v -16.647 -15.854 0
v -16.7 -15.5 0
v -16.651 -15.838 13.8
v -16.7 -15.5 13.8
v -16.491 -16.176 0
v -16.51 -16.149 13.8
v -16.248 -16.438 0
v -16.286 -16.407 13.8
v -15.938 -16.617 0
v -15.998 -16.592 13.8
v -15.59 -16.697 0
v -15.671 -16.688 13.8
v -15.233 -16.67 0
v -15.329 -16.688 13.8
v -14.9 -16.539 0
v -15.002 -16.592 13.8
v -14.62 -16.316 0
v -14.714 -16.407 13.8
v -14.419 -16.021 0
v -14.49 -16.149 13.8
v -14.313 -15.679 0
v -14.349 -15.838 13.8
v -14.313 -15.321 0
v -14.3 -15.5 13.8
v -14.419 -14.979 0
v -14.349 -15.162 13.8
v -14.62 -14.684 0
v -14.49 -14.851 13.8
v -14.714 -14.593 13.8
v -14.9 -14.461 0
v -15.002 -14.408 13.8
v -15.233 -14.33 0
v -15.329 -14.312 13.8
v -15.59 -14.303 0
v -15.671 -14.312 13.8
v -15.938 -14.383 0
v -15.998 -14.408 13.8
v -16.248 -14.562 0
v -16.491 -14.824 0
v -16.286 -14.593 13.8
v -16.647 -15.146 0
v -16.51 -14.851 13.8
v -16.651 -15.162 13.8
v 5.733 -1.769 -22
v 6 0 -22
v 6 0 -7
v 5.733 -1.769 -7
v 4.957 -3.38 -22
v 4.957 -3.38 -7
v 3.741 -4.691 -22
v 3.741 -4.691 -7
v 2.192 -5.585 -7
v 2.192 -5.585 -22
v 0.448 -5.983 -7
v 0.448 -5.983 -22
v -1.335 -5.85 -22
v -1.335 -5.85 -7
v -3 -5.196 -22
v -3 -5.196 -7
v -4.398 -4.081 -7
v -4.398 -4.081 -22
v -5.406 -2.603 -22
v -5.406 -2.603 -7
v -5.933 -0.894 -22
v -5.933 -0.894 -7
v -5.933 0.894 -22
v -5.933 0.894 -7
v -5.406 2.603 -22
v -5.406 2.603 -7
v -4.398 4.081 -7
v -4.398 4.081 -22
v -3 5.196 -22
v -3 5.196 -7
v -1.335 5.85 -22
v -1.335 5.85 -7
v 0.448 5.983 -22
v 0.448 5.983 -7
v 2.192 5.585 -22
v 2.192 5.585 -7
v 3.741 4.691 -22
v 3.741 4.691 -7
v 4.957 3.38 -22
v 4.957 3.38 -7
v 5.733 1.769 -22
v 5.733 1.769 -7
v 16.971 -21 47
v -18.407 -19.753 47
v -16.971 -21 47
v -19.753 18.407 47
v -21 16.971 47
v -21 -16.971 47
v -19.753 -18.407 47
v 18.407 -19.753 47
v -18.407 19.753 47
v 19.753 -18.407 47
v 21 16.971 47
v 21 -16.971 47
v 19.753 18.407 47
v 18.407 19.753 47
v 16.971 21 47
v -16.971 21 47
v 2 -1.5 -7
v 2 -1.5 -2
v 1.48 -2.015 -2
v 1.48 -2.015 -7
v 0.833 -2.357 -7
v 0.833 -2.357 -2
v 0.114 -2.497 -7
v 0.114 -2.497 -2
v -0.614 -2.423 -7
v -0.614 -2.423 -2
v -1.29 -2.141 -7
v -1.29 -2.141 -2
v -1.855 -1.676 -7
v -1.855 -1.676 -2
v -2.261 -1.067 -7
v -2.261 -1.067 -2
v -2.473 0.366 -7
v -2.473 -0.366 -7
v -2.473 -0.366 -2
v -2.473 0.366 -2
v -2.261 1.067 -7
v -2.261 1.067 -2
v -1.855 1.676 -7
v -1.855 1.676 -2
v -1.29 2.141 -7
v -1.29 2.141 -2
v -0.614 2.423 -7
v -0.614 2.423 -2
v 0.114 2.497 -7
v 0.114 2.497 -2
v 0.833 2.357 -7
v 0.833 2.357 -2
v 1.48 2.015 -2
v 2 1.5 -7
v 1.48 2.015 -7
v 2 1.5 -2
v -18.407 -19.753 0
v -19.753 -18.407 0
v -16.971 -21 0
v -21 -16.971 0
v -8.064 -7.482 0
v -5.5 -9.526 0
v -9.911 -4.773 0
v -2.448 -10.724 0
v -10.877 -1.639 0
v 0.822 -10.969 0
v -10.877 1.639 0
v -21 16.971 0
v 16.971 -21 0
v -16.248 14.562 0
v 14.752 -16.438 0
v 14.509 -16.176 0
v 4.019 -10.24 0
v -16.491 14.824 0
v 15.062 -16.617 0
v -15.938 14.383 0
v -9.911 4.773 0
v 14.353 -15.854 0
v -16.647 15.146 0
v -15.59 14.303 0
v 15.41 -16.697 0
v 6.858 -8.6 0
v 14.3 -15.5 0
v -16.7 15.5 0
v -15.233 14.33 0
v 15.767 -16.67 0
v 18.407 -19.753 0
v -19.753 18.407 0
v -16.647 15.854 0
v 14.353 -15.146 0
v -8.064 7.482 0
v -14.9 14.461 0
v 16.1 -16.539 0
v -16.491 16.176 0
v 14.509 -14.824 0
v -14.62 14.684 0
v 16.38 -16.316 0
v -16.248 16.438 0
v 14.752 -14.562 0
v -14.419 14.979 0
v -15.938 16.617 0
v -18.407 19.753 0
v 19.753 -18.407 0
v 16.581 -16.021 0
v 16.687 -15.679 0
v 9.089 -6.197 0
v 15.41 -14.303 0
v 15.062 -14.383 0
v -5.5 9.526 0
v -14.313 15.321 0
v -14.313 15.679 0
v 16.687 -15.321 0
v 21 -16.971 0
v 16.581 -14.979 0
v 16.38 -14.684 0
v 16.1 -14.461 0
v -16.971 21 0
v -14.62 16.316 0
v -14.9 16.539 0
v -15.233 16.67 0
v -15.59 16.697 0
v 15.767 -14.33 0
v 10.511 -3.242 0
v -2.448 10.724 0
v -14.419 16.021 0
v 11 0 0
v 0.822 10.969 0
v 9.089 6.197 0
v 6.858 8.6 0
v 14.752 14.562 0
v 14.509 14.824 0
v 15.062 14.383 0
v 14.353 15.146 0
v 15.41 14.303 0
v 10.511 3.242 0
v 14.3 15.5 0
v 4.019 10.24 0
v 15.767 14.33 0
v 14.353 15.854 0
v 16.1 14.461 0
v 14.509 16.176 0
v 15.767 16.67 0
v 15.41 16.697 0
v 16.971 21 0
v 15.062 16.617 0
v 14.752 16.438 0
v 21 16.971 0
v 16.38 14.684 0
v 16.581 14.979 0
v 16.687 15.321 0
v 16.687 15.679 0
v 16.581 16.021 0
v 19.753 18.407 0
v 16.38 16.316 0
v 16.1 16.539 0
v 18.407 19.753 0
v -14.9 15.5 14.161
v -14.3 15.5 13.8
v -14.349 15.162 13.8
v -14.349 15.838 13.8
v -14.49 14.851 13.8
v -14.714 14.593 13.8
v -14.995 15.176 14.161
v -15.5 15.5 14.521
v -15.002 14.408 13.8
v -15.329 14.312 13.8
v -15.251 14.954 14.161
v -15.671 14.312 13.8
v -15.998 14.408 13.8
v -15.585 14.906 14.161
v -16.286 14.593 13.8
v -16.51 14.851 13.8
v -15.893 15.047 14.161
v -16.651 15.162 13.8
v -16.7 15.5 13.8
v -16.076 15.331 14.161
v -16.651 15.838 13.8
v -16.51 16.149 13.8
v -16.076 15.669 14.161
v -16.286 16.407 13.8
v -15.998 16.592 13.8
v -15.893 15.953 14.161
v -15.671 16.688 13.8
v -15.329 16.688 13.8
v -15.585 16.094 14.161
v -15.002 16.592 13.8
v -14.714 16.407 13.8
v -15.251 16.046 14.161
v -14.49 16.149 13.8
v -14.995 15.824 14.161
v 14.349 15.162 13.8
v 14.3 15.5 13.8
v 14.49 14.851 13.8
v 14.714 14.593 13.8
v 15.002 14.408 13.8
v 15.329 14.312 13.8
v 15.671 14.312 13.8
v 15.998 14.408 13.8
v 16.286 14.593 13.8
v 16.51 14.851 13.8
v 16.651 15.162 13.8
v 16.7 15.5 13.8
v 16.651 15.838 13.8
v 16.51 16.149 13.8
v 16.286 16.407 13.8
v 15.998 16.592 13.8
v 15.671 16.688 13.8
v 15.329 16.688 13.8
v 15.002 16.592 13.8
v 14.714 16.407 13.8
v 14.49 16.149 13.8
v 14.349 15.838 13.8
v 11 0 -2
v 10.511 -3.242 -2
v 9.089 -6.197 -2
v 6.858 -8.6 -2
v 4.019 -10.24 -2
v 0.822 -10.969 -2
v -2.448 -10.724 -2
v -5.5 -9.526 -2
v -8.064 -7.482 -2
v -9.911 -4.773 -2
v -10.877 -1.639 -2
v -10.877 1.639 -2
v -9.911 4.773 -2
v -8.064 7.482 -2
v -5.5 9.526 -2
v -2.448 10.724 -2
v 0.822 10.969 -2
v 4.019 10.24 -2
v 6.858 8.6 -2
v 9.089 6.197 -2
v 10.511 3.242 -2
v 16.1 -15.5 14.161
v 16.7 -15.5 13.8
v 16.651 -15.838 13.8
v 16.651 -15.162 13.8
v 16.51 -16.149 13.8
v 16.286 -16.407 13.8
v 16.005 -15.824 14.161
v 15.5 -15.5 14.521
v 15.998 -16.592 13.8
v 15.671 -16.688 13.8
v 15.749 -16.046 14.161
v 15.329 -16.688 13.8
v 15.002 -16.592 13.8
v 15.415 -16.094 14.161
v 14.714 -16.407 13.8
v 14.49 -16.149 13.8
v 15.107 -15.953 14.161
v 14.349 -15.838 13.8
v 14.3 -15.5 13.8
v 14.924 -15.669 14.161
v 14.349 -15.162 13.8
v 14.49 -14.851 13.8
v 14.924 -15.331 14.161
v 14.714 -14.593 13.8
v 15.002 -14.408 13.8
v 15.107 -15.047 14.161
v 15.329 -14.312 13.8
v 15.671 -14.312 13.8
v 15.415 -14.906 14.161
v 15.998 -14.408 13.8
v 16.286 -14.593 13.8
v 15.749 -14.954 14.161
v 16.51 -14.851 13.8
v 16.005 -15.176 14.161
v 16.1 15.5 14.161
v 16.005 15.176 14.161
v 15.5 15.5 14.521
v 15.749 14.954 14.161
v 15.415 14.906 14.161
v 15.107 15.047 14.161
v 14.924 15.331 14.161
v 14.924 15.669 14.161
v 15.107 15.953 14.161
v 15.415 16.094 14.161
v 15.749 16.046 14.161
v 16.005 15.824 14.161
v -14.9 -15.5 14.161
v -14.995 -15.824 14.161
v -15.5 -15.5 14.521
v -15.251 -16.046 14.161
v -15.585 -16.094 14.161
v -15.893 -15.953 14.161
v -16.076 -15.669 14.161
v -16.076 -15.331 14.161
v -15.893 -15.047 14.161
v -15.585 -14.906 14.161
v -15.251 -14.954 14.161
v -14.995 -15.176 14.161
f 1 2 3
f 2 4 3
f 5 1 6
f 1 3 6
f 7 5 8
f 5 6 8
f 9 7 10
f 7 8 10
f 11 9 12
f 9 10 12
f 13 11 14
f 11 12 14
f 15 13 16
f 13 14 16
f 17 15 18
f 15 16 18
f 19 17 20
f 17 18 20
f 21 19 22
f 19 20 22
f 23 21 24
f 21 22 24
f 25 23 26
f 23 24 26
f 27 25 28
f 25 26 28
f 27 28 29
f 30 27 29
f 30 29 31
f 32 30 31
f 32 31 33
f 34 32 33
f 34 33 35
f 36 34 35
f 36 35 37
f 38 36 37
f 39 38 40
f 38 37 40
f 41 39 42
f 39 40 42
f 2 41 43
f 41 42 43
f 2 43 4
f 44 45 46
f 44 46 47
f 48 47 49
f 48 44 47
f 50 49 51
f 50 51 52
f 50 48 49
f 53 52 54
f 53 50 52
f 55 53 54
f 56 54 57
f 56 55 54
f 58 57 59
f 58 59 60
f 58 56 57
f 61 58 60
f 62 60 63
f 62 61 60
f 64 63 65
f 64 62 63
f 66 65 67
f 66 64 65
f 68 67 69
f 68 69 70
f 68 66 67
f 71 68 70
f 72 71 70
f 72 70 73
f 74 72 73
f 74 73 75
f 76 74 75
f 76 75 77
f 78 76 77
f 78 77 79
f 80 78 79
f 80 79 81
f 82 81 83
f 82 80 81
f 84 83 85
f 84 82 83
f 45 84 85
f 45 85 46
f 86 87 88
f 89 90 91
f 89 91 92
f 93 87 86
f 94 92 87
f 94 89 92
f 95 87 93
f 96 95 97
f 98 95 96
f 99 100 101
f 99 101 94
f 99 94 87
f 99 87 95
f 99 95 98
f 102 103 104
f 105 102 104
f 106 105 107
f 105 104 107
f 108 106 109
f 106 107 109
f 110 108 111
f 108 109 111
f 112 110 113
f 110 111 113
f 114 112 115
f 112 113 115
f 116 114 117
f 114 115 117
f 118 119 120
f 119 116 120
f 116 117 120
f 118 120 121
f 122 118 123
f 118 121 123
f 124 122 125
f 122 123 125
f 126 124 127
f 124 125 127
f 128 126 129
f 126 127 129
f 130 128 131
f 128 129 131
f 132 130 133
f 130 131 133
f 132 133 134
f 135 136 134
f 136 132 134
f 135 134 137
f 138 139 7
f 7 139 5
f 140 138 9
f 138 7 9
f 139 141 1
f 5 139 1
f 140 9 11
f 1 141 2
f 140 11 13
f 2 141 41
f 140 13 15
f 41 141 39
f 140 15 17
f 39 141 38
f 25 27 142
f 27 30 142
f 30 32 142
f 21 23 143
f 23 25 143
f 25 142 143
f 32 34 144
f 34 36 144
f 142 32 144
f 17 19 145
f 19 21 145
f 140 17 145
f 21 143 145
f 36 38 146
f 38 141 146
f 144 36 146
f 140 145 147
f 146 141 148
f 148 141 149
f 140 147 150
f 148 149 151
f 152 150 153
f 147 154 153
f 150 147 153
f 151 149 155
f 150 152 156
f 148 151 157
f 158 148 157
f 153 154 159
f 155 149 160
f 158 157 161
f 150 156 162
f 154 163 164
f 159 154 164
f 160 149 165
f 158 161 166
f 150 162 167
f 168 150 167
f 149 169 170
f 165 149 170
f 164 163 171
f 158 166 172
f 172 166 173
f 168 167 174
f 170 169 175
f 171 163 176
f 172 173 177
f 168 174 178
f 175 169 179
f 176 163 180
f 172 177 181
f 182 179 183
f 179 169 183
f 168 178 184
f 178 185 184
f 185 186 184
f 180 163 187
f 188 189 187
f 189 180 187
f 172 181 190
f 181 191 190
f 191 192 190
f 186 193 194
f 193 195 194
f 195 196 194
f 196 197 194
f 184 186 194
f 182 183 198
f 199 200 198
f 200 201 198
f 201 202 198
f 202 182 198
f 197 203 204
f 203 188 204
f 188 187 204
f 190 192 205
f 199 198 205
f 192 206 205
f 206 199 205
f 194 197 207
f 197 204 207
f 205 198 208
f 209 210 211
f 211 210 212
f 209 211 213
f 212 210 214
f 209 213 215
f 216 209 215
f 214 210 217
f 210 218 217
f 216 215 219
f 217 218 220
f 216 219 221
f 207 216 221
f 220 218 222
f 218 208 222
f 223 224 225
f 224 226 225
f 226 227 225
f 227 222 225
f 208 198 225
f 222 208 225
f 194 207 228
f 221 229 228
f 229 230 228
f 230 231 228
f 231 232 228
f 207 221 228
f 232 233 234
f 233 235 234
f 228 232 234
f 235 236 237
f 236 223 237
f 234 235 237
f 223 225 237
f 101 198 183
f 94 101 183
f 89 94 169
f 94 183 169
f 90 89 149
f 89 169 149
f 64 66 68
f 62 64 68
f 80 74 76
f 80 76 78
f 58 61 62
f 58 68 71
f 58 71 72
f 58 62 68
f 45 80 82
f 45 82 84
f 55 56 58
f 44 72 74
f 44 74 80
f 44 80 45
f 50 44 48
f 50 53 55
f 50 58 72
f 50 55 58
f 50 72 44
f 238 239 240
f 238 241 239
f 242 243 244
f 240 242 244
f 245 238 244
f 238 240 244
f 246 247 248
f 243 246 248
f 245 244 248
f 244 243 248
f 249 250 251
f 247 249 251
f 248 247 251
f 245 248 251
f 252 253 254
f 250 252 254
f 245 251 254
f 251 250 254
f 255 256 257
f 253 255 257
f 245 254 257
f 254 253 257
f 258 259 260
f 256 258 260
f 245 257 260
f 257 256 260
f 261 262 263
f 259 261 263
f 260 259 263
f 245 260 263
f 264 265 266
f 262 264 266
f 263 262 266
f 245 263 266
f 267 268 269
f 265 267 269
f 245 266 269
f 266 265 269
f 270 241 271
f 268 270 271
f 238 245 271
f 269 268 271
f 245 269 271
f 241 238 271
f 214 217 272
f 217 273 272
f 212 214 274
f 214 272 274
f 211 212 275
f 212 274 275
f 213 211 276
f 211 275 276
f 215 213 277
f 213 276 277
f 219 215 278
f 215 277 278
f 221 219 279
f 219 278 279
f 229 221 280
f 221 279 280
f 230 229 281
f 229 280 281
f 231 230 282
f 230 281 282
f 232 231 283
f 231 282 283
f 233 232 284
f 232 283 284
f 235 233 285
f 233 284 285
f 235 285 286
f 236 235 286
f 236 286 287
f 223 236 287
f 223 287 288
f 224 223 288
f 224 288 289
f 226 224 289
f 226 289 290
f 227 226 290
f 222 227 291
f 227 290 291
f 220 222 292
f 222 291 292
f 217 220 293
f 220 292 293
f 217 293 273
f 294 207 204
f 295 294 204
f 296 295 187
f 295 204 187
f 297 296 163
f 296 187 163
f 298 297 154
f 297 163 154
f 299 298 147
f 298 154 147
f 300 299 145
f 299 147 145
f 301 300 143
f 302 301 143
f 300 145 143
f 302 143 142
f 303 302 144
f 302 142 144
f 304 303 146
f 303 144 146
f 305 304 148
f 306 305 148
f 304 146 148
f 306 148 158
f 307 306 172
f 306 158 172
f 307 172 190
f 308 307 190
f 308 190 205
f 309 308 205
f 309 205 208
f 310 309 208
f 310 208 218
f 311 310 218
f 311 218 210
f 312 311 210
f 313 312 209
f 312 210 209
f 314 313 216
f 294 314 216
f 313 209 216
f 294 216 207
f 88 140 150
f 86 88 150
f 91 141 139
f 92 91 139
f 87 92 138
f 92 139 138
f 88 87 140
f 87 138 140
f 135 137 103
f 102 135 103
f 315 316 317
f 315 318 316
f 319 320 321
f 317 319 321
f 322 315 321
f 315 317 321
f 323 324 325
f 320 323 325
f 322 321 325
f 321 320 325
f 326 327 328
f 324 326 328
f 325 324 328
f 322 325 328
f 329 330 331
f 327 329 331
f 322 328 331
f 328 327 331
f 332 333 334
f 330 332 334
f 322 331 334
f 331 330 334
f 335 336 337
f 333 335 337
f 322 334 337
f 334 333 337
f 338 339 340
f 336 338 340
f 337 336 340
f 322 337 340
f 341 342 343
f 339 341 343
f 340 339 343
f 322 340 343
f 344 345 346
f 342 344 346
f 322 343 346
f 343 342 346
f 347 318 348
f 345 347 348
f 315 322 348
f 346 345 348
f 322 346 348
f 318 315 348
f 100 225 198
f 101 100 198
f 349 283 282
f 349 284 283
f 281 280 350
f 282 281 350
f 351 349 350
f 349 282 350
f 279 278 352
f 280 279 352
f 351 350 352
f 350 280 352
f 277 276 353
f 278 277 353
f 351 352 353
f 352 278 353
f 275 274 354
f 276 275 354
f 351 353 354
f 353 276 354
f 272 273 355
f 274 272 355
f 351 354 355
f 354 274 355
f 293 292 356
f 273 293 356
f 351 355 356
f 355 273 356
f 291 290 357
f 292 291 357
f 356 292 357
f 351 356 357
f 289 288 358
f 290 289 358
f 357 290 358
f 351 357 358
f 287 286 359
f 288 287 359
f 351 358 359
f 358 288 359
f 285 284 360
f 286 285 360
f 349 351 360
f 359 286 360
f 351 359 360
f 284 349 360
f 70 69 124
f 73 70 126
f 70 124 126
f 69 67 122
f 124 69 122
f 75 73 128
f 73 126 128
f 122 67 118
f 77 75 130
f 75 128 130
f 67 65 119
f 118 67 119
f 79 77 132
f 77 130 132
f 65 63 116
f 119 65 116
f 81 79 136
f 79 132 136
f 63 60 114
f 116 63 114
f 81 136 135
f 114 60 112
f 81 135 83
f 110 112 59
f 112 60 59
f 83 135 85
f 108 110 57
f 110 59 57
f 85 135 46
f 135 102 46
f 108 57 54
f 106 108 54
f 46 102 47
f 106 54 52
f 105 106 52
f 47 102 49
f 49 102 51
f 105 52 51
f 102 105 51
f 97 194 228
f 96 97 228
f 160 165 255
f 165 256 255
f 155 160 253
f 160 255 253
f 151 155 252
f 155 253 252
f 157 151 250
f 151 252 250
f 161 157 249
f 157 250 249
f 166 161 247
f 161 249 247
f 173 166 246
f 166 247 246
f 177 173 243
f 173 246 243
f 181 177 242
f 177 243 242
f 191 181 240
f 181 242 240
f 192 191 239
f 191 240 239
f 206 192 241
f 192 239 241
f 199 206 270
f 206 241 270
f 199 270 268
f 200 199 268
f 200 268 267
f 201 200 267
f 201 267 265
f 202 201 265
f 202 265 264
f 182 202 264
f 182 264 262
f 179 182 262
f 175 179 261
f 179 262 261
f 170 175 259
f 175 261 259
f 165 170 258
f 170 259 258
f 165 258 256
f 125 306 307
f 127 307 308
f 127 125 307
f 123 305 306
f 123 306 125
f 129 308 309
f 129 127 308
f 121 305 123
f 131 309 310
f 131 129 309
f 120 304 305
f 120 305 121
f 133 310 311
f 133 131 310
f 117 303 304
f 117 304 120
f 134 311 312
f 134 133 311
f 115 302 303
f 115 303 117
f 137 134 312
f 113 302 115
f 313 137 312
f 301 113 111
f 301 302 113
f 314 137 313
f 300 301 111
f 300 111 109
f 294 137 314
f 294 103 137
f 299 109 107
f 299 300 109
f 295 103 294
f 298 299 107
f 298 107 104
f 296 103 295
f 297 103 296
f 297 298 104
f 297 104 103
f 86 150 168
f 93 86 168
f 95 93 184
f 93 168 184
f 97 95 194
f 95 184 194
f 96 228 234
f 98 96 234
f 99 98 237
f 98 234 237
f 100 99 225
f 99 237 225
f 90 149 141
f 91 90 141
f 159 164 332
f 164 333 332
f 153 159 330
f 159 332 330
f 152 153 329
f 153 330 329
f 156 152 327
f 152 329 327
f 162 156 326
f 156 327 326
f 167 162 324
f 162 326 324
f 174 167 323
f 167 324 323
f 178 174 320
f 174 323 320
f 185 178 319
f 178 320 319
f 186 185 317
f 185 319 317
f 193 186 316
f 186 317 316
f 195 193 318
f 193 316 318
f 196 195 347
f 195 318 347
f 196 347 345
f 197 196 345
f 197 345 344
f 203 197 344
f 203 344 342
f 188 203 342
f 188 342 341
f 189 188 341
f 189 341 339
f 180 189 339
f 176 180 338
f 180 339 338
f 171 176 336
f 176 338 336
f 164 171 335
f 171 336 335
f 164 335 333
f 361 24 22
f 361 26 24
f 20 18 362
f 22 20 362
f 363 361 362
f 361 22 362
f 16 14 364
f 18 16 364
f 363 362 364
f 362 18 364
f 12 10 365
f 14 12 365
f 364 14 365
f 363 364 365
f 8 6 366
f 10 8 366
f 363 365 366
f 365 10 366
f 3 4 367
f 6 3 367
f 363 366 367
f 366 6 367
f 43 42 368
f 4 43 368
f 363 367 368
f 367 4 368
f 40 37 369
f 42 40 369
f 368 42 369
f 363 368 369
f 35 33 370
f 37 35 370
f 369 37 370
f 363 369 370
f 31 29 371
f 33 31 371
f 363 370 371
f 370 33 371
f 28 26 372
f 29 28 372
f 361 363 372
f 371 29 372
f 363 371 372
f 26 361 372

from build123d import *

# Parameters (mm, degrees)
F1_DEPTH = 47
F2_R     = 11
F3_DEPTH = 2
F4_D     = 2.4
F4_DEPTH = 13.8
F4_TIP   = 0.7210327428
F6_DEPTH = 20
F7_R     = 6
F8_DEPTH = 15


with BuildPart() as f1:
    # F0 (on Top) → F1 (new body)
    with BuildSketch(Plane.XY):
        with BuildLine():
            ThreePointArc((21, 16.9705627485), (19.091883092, 19.091883092), (16.9705627485, 21))
            Line((16.9705627485, 21), (-16.9705627485, 21))
            ThreePointArc((-16.9705627485, 21), (-19.091883092, 19.091883092), (-21, 16.9705627485))
            Line((-21, 16.9705627485), (-21, -16.9705627485))
            ThreePointArc((-21, -16.9705627485), (-19.091883092, -19.091883092), (-16.9705627485, -21))
            Line((-16.9705627485, -21), (16.9705627485, -21))
            ThreePointArc((16.9705627485, -21), (19.091883092, -19.091883092), (21, -16.9705627485))
            Line((21, -16.9705627485), (21, 16.9705627485))
        make_face()
    extrude(amount=F1_DEPTH)

    # F2 (on face) → F3 (join)
    with BuildSketch(Plane(origin=(0, 0, 0), x_dir=(1, 0, 0), z_dir=(0, 0, -1))):
        Circle(F2_R)
    extrude(amount=F3_DEPTH)

    # F4
    with Locations(Plane(origin=(0, 0, 0), x_dir=(1, 0, 0), z_dir=(0, 0, -1))):
        with Locations((-15.5, 15.5), (15.5, 15.5), (15.5, -15.5), (-15.5, -15.5)):
            Hole(F4_D / 2, depth=F4_DEPTH)
            with Locations((0, 0, -(F4_DEPTH + F4_TIP / 2))):  # 118° drill point
                Cone(0, F4_D / 2, F4_TIP, mode=Mode.SUBTRACT)

    # F5 (on face) → F6 (join)
    with BuildSketch(Plane(origin=(0, 0, -2), x_dir=(1, 0, 0), z_dir=(0, 0, -1))):
        with BuildLine():
            Line((2, -1.5), (2, 1.5))
            ThreePointArc((2, 1.5), (-2.5, 0), (2, -1.5))
        make_face()
    extrude(amount=F6_DEPTH)

    # F7 (on face) → F8 (join)
    with BuildSketch(Plane(origin=(0, 0, -22), x_dir=(1, 0, 0), z_dir=(0, 0, -1))):
        Circle(F7_R)
    extrude(amount=-F8_DEPTH)


solid = f1.part
